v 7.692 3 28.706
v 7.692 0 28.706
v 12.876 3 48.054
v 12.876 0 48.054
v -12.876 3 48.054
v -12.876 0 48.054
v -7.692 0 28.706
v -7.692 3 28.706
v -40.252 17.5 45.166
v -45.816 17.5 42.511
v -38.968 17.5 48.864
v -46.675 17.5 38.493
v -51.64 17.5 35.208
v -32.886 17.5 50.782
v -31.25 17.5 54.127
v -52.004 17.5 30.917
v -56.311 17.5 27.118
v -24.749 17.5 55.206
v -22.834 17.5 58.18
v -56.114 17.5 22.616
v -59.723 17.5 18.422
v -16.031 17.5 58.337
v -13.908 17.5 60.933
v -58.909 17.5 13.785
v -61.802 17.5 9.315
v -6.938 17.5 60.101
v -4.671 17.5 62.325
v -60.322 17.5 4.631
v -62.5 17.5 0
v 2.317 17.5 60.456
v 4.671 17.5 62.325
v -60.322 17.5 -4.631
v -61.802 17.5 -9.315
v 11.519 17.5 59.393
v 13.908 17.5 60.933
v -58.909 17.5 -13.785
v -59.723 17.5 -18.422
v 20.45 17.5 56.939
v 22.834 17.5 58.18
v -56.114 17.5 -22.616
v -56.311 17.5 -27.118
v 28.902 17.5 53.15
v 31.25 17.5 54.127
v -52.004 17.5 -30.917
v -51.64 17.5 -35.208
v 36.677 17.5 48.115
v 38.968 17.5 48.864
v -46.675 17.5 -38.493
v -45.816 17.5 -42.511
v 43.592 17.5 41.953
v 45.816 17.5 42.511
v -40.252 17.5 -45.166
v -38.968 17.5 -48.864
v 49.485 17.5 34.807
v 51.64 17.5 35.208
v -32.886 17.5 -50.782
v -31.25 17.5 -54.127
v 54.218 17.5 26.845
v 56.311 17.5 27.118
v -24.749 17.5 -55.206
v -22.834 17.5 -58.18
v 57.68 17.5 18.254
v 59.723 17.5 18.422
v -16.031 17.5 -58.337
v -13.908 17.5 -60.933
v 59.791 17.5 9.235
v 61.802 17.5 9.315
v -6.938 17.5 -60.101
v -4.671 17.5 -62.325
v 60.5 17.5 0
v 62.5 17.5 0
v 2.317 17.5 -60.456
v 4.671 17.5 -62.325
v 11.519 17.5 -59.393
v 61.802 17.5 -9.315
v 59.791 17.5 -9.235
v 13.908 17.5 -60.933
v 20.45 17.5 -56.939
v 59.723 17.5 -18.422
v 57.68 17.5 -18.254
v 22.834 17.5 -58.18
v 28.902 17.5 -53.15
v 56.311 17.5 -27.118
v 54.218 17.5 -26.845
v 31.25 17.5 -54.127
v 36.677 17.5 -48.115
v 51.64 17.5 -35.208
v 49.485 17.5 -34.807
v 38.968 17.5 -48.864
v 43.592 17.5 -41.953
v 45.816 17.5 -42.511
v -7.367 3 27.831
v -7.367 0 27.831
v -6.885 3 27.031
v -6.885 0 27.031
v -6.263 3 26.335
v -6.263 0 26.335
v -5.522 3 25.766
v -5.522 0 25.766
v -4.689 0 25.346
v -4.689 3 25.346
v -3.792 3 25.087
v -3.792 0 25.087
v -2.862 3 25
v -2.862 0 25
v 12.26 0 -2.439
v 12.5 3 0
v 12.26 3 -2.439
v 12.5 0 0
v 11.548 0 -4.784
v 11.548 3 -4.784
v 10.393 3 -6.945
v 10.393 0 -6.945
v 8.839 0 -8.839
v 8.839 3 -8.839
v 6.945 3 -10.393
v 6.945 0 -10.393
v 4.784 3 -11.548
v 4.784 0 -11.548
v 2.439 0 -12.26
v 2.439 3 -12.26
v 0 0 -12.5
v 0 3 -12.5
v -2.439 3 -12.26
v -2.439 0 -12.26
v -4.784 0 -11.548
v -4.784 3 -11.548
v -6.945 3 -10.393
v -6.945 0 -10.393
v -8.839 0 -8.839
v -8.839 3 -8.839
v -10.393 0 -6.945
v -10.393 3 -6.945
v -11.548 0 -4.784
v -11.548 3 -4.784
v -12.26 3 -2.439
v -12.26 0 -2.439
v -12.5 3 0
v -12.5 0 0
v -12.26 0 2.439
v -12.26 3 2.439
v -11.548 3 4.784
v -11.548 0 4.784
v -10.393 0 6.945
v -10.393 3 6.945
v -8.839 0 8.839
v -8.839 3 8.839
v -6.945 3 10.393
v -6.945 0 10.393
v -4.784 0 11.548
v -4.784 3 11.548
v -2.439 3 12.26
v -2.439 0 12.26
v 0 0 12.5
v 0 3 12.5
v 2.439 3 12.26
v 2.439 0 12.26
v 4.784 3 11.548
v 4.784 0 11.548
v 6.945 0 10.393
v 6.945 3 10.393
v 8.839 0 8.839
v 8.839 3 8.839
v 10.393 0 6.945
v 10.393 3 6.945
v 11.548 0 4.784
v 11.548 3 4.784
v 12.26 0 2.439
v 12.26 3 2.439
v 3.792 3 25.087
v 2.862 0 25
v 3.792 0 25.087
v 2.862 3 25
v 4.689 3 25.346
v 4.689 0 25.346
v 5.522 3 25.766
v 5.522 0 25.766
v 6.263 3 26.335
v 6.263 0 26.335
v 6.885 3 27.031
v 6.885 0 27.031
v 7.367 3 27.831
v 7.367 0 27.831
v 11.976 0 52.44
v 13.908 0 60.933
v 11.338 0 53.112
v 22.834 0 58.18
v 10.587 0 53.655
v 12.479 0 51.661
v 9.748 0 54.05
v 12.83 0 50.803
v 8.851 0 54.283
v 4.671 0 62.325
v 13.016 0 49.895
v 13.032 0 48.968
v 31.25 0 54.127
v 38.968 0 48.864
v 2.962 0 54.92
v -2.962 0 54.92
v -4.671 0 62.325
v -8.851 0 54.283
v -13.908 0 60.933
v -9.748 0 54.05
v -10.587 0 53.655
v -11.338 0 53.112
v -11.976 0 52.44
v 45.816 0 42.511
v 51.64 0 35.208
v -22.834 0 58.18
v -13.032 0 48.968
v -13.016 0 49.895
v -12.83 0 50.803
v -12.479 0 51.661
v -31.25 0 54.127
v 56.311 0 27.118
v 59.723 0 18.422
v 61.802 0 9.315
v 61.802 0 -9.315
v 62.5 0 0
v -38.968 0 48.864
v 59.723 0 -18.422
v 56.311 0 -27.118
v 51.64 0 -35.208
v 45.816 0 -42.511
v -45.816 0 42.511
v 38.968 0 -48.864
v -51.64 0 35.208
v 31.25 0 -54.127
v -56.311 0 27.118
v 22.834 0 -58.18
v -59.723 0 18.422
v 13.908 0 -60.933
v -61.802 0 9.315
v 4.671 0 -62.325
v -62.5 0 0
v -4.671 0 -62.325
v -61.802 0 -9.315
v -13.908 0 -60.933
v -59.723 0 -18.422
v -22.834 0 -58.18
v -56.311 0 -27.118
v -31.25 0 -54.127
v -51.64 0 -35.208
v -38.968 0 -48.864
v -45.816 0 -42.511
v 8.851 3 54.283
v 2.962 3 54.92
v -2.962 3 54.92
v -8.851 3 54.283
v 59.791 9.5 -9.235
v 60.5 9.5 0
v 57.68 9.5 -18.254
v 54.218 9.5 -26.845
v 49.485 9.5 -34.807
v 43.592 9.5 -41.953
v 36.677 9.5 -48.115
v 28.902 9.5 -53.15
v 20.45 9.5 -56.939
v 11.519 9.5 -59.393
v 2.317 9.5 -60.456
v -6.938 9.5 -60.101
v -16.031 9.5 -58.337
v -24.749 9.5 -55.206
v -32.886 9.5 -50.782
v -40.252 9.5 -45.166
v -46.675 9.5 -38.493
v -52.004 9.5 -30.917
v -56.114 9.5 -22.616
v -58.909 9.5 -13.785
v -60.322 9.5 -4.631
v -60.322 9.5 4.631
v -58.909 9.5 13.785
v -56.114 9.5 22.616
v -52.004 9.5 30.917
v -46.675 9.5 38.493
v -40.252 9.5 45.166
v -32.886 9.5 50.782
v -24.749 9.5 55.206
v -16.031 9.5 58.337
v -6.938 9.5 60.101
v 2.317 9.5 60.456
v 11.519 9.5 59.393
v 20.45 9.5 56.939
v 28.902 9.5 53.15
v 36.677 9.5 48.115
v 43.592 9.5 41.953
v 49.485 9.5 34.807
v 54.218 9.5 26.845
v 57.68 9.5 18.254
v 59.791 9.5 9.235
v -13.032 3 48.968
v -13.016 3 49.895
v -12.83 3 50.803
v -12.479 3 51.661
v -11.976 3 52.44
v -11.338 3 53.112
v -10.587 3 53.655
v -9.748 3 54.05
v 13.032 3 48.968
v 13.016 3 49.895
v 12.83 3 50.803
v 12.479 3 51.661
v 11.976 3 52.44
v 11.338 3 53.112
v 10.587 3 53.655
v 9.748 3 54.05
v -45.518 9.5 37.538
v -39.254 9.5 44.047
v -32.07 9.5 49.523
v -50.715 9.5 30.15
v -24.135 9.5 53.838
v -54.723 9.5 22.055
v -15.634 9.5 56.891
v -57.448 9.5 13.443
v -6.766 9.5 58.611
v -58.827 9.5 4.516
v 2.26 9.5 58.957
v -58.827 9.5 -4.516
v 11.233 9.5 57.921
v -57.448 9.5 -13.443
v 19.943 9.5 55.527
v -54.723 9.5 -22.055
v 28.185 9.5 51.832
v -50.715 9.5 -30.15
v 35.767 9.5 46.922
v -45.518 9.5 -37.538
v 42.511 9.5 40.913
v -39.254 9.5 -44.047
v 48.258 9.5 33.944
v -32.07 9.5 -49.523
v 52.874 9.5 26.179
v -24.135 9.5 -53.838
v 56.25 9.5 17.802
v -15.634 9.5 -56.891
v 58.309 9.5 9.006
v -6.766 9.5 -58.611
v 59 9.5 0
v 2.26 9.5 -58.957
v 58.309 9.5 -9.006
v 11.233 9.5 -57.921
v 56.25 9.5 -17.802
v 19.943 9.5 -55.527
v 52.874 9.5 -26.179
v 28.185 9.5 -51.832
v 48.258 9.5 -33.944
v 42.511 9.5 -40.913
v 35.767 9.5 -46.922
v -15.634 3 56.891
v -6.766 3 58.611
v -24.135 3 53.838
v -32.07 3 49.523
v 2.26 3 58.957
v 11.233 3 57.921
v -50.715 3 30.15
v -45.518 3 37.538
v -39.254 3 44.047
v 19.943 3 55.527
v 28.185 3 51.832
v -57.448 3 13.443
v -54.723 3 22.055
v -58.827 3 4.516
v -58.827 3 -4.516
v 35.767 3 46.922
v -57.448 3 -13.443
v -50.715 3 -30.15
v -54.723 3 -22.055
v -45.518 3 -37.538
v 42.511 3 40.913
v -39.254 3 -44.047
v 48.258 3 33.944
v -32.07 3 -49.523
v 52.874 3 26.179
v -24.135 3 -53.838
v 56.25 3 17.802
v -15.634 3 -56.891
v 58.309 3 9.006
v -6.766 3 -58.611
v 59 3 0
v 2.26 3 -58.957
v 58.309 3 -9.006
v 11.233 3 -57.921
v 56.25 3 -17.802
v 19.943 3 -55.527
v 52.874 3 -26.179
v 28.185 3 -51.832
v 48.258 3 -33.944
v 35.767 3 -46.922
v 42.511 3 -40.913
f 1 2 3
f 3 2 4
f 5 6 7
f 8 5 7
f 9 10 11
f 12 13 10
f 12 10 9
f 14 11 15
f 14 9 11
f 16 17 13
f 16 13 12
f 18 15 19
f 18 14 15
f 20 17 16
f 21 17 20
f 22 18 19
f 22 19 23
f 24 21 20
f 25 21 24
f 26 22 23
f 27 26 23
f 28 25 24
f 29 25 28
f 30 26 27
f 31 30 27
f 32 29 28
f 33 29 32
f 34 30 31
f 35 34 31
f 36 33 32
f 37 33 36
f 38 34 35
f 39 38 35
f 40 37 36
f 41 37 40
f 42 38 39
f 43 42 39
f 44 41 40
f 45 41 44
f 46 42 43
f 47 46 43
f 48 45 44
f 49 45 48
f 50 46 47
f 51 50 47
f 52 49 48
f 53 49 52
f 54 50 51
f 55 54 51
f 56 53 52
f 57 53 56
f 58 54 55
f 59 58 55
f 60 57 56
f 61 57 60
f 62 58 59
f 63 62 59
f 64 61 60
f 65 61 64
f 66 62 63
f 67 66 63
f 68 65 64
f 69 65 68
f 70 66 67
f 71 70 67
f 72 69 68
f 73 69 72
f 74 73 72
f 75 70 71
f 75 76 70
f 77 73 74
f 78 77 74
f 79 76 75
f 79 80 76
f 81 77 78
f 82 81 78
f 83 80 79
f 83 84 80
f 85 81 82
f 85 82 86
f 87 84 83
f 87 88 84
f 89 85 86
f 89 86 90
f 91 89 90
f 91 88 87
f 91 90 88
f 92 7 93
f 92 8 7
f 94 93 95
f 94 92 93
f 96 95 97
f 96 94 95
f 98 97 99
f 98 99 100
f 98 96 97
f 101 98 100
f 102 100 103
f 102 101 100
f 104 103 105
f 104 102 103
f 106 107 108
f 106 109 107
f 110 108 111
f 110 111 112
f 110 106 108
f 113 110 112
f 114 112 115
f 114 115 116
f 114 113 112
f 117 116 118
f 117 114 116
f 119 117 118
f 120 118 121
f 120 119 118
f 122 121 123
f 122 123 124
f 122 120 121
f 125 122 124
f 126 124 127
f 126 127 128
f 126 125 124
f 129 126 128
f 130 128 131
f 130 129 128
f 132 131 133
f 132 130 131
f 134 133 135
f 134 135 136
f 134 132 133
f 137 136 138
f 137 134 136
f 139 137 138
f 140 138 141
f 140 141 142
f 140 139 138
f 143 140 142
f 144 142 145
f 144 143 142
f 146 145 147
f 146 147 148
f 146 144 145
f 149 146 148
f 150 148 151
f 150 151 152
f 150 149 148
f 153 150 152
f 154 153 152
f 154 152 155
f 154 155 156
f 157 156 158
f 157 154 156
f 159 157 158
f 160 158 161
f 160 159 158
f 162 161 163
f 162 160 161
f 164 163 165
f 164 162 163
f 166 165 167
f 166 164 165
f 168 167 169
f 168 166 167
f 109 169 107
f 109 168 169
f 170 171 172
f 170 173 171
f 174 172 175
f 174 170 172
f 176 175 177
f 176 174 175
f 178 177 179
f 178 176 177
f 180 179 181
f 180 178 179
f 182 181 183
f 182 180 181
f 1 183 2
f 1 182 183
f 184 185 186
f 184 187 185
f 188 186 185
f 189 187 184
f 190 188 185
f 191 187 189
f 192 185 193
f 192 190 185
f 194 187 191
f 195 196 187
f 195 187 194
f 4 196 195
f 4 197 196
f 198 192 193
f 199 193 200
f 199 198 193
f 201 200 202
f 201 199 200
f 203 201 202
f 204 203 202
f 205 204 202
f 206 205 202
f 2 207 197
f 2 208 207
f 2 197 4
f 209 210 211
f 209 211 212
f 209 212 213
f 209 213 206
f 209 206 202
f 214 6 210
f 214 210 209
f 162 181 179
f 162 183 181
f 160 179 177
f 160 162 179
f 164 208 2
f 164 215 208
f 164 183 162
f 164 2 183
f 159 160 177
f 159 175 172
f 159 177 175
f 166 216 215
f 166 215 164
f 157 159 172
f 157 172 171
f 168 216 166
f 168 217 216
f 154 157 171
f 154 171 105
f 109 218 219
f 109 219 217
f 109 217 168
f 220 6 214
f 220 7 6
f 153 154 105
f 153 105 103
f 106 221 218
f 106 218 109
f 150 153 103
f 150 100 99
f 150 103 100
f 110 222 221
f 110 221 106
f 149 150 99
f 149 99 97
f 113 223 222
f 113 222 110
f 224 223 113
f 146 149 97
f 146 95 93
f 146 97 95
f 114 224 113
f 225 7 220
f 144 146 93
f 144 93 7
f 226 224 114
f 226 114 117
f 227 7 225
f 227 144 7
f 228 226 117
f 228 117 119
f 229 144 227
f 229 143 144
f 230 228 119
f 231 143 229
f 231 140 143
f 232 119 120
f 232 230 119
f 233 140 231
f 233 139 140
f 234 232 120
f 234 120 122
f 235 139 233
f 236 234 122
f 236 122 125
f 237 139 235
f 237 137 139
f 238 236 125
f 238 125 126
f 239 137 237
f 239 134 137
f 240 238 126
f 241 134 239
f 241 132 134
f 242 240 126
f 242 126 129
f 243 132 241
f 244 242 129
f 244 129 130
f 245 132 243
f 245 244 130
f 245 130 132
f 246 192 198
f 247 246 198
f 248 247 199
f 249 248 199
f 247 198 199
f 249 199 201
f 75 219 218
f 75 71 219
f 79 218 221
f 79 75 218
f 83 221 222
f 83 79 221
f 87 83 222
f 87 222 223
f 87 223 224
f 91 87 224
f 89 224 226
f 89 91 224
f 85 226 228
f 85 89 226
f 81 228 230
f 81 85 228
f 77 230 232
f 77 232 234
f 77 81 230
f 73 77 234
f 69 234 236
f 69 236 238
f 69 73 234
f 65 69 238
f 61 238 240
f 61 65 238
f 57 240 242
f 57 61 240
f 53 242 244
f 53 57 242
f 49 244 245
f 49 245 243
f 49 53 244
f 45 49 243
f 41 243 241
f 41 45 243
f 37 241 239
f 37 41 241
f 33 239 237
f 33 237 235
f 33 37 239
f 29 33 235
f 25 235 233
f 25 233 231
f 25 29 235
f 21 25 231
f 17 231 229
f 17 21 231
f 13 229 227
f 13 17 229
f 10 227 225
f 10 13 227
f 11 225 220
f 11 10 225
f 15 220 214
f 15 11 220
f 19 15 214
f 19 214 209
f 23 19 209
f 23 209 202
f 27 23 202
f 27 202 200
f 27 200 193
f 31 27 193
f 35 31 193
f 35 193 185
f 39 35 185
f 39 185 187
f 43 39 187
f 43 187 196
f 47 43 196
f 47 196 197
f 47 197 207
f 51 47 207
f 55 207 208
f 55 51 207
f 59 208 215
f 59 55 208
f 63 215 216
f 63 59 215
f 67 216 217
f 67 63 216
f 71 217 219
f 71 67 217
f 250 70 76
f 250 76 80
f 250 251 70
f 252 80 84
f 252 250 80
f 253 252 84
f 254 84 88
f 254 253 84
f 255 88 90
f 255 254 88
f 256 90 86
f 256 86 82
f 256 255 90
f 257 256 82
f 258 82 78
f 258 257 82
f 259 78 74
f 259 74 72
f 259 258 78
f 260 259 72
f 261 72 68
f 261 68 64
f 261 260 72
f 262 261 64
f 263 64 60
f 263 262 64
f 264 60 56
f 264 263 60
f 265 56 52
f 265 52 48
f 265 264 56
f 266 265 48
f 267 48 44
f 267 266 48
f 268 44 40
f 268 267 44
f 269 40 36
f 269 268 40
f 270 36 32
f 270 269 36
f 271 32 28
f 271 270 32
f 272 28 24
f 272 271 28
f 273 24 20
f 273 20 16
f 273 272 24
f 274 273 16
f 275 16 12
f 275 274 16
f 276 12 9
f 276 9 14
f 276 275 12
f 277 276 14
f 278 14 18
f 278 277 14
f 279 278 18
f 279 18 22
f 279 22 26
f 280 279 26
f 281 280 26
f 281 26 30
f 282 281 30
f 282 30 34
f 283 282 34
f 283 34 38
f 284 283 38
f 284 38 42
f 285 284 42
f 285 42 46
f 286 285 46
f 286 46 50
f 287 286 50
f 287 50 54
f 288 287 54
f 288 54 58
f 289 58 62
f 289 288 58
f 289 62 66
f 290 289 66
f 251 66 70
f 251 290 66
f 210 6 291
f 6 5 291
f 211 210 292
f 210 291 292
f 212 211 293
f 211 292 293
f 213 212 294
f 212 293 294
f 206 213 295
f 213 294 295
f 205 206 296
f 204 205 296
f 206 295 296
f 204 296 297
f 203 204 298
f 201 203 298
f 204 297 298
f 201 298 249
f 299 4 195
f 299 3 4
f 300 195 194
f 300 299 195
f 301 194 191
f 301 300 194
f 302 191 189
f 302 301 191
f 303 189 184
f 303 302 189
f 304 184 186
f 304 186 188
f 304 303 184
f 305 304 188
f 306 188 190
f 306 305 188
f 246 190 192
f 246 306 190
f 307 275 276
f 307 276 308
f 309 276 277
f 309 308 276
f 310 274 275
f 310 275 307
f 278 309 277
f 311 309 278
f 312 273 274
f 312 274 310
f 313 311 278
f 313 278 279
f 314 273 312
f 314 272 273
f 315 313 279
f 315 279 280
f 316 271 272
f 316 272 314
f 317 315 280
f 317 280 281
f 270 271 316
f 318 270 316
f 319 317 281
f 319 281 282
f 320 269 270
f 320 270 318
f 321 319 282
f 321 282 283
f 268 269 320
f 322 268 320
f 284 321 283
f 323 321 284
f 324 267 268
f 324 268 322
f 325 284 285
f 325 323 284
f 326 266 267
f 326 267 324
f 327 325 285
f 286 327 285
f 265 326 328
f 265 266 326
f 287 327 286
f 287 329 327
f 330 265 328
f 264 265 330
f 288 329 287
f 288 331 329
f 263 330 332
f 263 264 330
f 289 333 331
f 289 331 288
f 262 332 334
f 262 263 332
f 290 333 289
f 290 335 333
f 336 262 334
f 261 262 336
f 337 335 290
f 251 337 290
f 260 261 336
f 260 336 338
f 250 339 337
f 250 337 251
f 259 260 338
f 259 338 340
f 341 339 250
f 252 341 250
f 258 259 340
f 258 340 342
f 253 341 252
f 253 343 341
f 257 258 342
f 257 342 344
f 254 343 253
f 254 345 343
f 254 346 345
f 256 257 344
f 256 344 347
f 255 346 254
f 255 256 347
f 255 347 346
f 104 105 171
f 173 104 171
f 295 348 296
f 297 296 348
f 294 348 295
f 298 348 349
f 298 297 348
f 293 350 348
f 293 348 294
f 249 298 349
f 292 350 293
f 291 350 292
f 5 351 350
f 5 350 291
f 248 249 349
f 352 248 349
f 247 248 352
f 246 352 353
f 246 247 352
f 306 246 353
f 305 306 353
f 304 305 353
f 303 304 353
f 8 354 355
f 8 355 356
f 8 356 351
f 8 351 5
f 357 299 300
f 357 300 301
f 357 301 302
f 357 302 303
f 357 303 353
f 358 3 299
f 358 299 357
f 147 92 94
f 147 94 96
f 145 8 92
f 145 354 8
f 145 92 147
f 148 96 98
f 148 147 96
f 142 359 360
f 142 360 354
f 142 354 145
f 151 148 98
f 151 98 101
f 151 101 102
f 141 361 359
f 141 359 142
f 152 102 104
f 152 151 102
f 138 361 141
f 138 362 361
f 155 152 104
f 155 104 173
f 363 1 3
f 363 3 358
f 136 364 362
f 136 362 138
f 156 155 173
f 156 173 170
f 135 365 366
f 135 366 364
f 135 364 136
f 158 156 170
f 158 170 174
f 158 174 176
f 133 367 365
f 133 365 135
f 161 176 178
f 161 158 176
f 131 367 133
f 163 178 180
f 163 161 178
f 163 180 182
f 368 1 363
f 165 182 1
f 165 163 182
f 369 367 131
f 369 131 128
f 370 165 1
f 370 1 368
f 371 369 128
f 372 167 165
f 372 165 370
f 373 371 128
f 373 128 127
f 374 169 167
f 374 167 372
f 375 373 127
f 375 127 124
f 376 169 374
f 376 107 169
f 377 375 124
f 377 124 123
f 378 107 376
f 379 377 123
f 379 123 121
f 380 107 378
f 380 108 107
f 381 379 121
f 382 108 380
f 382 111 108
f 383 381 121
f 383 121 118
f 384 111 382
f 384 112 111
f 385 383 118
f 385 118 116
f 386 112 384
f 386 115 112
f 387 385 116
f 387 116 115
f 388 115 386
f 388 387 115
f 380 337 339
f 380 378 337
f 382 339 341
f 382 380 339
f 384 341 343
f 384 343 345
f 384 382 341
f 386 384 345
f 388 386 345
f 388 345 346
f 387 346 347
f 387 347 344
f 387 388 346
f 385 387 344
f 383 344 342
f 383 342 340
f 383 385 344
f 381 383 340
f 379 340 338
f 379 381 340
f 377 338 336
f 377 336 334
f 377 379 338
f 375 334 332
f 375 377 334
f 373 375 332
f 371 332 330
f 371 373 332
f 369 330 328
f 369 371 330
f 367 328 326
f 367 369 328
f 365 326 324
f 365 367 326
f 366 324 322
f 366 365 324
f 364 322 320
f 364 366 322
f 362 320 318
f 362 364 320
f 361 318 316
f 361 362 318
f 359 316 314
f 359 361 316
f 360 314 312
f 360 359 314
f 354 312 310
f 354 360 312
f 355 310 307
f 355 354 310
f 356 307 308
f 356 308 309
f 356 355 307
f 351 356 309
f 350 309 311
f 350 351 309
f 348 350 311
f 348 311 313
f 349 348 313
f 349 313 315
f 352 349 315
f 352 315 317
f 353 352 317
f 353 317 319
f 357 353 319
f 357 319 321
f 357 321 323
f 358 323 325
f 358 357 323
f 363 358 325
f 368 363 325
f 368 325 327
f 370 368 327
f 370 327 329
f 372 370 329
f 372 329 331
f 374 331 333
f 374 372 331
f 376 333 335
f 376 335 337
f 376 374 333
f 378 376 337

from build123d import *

# Parameters (mm, degrees)
CUT_EXTRUDE1_DEPTH = 18.5
FILLET1_R          = 5


with BuildPart() as part:
    # Sketch2 → Revolve1 (revolve)
    with BuildSketch(Plane.XY):
        Polygon((12.5, 0), (62.5, 0), (62.5, 17.5), (60.5, 17.5), (60.5, 9.5), (59, 9.5), (59, 3), (12.5, 3), align=None)
    revolve(axis=Axis((0, 0, 0), (0, 1, 0)))

    # Sketch3 → Cut-Extrude1 (cut, through all)
    with BuildSketch(Plane.XZ):
        with BuildLine():
            Line((-14.235047481, 53.125920446), (-6.698729811, 25))
            Line((-6.698729811, 25), (6.698729811, 25))
            Line((6.698729811, 25), (14.235047481, 53.125920446))
            ThreePointArc((14.235047481, 53.125920446), (0, 55), (-14.235047481, 53.125920446))
        make_face()
    extrude(amount=-CUT_EXTRUDE1_DEPTH, mode=Mode.SUBTRACT)

    # Fillet1
    fillet1_edges = [part.edges().sort_by_distance(p)[0] for p in [
        (6.698729811, 1.5, 25),
        (-6.698729811, 1.5, 25),
        (-14.235047481, 1.5, 53.125920446),
        (14.235047481, 1.5, 53.125920446),
    ]]
    fillet(fillet1_edges, radius=FILLET1_R)


solid = part.part
